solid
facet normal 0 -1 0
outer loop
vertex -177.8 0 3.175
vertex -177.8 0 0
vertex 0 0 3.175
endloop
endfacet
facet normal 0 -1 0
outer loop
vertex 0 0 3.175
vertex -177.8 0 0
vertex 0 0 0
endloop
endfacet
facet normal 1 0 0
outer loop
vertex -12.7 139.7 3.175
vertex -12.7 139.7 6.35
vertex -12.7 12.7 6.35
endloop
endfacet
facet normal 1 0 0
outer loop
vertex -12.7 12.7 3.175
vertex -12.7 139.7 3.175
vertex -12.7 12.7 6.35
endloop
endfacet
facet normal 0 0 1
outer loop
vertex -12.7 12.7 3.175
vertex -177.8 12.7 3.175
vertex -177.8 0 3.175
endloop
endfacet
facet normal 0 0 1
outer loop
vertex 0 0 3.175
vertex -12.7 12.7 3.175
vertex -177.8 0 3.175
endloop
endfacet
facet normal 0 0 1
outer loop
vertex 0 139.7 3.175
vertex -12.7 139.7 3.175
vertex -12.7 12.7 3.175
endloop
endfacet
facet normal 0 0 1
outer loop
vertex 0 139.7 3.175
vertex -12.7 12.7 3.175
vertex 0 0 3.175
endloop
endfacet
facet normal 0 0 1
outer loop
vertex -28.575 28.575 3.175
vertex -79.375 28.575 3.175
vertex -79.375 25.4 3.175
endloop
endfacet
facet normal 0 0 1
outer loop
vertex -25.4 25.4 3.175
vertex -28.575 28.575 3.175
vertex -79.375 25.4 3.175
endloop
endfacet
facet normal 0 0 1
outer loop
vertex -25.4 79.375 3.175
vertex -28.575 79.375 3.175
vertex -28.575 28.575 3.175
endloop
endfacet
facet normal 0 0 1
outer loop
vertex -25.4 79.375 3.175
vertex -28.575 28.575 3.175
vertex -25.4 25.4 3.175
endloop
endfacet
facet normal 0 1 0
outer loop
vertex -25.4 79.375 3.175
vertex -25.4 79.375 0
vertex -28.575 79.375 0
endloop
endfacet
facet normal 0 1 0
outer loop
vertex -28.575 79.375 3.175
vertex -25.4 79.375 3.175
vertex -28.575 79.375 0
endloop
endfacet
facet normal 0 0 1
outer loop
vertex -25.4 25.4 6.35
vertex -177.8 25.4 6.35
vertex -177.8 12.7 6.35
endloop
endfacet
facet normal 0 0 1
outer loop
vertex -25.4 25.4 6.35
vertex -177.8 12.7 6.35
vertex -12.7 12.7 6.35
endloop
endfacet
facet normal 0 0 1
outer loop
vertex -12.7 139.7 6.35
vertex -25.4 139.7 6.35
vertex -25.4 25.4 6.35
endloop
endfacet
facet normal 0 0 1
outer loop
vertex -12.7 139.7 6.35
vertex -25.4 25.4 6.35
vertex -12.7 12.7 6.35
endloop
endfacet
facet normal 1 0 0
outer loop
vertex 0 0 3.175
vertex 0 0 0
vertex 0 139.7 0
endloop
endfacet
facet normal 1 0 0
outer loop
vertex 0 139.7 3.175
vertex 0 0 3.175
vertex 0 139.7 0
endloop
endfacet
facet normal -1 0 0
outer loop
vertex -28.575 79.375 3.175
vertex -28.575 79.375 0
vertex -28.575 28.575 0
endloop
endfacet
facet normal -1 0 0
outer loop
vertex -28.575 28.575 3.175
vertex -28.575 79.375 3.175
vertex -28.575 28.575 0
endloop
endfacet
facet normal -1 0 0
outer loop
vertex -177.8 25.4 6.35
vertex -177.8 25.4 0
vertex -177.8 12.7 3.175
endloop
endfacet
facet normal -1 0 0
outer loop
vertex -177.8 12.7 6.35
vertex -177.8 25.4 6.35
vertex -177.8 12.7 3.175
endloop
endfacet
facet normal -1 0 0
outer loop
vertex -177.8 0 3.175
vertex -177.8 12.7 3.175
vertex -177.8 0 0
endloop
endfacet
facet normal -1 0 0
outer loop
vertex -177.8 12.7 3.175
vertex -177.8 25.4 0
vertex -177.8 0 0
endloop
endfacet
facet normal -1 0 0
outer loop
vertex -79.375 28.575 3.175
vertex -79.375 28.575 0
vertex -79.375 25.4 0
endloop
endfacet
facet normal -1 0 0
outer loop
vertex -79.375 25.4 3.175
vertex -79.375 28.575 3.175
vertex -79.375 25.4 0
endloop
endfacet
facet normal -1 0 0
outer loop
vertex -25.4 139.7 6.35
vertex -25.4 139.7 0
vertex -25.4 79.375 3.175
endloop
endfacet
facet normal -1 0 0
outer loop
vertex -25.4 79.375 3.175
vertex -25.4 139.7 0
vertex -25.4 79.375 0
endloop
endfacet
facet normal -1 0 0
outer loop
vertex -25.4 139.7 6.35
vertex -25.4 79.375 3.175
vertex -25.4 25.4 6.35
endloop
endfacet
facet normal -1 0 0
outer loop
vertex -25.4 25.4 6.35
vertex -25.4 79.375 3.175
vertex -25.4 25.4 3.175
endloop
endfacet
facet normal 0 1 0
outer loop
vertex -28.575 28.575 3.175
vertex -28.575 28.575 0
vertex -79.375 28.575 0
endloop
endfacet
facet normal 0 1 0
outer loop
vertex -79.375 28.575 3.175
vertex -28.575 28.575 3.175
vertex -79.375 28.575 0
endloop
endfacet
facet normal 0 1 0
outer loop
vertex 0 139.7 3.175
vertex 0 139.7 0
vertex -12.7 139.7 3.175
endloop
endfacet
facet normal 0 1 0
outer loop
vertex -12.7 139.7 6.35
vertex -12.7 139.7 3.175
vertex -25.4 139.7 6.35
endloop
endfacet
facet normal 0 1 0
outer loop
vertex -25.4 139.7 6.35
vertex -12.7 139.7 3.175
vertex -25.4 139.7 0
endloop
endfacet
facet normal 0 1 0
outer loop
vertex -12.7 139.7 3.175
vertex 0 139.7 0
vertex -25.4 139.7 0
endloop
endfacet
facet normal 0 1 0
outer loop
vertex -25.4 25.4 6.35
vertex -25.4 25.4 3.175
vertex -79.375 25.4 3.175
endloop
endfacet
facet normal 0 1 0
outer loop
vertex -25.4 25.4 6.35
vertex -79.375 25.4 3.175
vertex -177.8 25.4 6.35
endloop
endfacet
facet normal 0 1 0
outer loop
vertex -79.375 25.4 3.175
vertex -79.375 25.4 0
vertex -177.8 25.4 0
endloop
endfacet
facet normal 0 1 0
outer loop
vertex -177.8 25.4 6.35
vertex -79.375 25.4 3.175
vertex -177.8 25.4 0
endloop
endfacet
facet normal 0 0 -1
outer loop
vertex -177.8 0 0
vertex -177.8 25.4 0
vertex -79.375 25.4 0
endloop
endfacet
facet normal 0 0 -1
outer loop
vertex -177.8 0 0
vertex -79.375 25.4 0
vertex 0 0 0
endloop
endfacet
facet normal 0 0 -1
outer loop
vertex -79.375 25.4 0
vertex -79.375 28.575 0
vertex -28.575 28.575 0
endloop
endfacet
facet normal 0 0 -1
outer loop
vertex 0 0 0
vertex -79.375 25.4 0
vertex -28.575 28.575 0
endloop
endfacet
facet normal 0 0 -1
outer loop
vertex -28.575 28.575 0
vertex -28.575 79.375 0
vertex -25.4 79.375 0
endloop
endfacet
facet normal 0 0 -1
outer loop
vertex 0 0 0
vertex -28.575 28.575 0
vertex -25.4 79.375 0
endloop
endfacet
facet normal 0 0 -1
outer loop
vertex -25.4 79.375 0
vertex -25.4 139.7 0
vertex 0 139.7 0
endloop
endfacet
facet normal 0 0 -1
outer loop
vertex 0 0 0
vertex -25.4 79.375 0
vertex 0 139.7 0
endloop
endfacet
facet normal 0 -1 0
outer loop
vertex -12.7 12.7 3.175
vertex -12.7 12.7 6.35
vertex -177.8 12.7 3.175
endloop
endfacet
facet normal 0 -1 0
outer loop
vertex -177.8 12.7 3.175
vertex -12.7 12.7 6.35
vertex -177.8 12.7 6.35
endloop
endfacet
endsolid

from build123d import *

# Parameters (mm, degrees)
F1_DEPTH = 6.35
F3_DEPTH = 3.175
F5_DEPTH = 3.175


with BuildPart() as f1:
    # F0 (on Top) → F1 (new body)
    with BuildSketch(Plane.XY):
        Polygon((-177.8, 0), (0, 0), (0, 139.7), (-25.4, 139.7), (-25.4, 79.375), (-25.4, 25.4), (-79.375, 25.4), (-177.8, 25.4), align=None)
        Polygon((-79.375, 28.575), (-79.375, 25.4), (-25.4, 25.4), (-25.4, 79.375), (-28.575, 79.375), (-28.575, 28.575), align=None)
    extrude(amount=F1_DEPTH)

    # F2 (on face) → F3 (cut)
    with BuildSketch(Plane.XY.offset(6.35)):
        Polygon((0, 139.7), (-12.7, 139.7), (-12.7, 12.7), (-177.8, 12.7), (-177.8, 0), (-12.7, 0), (0, 0), (0, 12.7), align=None)
    extrude(amount=-F3_DEPTH, mode=Mode.SUBTRACT)

    # F4 (on face) → F5 (cut)
    with BuildSketch(Plane.XY.offset(6.35)):
        Polygon((-28.575, 28.575), (-79.375, 28.575), (-79.375, 25.4), (-25.4, 25.4), (-25.4, 79.375), (-28.575, 79.375), align=None)
    extrude(amount=-F5_DEPTH, mode=Mode.SUBTRACT)


solid = f1.part
